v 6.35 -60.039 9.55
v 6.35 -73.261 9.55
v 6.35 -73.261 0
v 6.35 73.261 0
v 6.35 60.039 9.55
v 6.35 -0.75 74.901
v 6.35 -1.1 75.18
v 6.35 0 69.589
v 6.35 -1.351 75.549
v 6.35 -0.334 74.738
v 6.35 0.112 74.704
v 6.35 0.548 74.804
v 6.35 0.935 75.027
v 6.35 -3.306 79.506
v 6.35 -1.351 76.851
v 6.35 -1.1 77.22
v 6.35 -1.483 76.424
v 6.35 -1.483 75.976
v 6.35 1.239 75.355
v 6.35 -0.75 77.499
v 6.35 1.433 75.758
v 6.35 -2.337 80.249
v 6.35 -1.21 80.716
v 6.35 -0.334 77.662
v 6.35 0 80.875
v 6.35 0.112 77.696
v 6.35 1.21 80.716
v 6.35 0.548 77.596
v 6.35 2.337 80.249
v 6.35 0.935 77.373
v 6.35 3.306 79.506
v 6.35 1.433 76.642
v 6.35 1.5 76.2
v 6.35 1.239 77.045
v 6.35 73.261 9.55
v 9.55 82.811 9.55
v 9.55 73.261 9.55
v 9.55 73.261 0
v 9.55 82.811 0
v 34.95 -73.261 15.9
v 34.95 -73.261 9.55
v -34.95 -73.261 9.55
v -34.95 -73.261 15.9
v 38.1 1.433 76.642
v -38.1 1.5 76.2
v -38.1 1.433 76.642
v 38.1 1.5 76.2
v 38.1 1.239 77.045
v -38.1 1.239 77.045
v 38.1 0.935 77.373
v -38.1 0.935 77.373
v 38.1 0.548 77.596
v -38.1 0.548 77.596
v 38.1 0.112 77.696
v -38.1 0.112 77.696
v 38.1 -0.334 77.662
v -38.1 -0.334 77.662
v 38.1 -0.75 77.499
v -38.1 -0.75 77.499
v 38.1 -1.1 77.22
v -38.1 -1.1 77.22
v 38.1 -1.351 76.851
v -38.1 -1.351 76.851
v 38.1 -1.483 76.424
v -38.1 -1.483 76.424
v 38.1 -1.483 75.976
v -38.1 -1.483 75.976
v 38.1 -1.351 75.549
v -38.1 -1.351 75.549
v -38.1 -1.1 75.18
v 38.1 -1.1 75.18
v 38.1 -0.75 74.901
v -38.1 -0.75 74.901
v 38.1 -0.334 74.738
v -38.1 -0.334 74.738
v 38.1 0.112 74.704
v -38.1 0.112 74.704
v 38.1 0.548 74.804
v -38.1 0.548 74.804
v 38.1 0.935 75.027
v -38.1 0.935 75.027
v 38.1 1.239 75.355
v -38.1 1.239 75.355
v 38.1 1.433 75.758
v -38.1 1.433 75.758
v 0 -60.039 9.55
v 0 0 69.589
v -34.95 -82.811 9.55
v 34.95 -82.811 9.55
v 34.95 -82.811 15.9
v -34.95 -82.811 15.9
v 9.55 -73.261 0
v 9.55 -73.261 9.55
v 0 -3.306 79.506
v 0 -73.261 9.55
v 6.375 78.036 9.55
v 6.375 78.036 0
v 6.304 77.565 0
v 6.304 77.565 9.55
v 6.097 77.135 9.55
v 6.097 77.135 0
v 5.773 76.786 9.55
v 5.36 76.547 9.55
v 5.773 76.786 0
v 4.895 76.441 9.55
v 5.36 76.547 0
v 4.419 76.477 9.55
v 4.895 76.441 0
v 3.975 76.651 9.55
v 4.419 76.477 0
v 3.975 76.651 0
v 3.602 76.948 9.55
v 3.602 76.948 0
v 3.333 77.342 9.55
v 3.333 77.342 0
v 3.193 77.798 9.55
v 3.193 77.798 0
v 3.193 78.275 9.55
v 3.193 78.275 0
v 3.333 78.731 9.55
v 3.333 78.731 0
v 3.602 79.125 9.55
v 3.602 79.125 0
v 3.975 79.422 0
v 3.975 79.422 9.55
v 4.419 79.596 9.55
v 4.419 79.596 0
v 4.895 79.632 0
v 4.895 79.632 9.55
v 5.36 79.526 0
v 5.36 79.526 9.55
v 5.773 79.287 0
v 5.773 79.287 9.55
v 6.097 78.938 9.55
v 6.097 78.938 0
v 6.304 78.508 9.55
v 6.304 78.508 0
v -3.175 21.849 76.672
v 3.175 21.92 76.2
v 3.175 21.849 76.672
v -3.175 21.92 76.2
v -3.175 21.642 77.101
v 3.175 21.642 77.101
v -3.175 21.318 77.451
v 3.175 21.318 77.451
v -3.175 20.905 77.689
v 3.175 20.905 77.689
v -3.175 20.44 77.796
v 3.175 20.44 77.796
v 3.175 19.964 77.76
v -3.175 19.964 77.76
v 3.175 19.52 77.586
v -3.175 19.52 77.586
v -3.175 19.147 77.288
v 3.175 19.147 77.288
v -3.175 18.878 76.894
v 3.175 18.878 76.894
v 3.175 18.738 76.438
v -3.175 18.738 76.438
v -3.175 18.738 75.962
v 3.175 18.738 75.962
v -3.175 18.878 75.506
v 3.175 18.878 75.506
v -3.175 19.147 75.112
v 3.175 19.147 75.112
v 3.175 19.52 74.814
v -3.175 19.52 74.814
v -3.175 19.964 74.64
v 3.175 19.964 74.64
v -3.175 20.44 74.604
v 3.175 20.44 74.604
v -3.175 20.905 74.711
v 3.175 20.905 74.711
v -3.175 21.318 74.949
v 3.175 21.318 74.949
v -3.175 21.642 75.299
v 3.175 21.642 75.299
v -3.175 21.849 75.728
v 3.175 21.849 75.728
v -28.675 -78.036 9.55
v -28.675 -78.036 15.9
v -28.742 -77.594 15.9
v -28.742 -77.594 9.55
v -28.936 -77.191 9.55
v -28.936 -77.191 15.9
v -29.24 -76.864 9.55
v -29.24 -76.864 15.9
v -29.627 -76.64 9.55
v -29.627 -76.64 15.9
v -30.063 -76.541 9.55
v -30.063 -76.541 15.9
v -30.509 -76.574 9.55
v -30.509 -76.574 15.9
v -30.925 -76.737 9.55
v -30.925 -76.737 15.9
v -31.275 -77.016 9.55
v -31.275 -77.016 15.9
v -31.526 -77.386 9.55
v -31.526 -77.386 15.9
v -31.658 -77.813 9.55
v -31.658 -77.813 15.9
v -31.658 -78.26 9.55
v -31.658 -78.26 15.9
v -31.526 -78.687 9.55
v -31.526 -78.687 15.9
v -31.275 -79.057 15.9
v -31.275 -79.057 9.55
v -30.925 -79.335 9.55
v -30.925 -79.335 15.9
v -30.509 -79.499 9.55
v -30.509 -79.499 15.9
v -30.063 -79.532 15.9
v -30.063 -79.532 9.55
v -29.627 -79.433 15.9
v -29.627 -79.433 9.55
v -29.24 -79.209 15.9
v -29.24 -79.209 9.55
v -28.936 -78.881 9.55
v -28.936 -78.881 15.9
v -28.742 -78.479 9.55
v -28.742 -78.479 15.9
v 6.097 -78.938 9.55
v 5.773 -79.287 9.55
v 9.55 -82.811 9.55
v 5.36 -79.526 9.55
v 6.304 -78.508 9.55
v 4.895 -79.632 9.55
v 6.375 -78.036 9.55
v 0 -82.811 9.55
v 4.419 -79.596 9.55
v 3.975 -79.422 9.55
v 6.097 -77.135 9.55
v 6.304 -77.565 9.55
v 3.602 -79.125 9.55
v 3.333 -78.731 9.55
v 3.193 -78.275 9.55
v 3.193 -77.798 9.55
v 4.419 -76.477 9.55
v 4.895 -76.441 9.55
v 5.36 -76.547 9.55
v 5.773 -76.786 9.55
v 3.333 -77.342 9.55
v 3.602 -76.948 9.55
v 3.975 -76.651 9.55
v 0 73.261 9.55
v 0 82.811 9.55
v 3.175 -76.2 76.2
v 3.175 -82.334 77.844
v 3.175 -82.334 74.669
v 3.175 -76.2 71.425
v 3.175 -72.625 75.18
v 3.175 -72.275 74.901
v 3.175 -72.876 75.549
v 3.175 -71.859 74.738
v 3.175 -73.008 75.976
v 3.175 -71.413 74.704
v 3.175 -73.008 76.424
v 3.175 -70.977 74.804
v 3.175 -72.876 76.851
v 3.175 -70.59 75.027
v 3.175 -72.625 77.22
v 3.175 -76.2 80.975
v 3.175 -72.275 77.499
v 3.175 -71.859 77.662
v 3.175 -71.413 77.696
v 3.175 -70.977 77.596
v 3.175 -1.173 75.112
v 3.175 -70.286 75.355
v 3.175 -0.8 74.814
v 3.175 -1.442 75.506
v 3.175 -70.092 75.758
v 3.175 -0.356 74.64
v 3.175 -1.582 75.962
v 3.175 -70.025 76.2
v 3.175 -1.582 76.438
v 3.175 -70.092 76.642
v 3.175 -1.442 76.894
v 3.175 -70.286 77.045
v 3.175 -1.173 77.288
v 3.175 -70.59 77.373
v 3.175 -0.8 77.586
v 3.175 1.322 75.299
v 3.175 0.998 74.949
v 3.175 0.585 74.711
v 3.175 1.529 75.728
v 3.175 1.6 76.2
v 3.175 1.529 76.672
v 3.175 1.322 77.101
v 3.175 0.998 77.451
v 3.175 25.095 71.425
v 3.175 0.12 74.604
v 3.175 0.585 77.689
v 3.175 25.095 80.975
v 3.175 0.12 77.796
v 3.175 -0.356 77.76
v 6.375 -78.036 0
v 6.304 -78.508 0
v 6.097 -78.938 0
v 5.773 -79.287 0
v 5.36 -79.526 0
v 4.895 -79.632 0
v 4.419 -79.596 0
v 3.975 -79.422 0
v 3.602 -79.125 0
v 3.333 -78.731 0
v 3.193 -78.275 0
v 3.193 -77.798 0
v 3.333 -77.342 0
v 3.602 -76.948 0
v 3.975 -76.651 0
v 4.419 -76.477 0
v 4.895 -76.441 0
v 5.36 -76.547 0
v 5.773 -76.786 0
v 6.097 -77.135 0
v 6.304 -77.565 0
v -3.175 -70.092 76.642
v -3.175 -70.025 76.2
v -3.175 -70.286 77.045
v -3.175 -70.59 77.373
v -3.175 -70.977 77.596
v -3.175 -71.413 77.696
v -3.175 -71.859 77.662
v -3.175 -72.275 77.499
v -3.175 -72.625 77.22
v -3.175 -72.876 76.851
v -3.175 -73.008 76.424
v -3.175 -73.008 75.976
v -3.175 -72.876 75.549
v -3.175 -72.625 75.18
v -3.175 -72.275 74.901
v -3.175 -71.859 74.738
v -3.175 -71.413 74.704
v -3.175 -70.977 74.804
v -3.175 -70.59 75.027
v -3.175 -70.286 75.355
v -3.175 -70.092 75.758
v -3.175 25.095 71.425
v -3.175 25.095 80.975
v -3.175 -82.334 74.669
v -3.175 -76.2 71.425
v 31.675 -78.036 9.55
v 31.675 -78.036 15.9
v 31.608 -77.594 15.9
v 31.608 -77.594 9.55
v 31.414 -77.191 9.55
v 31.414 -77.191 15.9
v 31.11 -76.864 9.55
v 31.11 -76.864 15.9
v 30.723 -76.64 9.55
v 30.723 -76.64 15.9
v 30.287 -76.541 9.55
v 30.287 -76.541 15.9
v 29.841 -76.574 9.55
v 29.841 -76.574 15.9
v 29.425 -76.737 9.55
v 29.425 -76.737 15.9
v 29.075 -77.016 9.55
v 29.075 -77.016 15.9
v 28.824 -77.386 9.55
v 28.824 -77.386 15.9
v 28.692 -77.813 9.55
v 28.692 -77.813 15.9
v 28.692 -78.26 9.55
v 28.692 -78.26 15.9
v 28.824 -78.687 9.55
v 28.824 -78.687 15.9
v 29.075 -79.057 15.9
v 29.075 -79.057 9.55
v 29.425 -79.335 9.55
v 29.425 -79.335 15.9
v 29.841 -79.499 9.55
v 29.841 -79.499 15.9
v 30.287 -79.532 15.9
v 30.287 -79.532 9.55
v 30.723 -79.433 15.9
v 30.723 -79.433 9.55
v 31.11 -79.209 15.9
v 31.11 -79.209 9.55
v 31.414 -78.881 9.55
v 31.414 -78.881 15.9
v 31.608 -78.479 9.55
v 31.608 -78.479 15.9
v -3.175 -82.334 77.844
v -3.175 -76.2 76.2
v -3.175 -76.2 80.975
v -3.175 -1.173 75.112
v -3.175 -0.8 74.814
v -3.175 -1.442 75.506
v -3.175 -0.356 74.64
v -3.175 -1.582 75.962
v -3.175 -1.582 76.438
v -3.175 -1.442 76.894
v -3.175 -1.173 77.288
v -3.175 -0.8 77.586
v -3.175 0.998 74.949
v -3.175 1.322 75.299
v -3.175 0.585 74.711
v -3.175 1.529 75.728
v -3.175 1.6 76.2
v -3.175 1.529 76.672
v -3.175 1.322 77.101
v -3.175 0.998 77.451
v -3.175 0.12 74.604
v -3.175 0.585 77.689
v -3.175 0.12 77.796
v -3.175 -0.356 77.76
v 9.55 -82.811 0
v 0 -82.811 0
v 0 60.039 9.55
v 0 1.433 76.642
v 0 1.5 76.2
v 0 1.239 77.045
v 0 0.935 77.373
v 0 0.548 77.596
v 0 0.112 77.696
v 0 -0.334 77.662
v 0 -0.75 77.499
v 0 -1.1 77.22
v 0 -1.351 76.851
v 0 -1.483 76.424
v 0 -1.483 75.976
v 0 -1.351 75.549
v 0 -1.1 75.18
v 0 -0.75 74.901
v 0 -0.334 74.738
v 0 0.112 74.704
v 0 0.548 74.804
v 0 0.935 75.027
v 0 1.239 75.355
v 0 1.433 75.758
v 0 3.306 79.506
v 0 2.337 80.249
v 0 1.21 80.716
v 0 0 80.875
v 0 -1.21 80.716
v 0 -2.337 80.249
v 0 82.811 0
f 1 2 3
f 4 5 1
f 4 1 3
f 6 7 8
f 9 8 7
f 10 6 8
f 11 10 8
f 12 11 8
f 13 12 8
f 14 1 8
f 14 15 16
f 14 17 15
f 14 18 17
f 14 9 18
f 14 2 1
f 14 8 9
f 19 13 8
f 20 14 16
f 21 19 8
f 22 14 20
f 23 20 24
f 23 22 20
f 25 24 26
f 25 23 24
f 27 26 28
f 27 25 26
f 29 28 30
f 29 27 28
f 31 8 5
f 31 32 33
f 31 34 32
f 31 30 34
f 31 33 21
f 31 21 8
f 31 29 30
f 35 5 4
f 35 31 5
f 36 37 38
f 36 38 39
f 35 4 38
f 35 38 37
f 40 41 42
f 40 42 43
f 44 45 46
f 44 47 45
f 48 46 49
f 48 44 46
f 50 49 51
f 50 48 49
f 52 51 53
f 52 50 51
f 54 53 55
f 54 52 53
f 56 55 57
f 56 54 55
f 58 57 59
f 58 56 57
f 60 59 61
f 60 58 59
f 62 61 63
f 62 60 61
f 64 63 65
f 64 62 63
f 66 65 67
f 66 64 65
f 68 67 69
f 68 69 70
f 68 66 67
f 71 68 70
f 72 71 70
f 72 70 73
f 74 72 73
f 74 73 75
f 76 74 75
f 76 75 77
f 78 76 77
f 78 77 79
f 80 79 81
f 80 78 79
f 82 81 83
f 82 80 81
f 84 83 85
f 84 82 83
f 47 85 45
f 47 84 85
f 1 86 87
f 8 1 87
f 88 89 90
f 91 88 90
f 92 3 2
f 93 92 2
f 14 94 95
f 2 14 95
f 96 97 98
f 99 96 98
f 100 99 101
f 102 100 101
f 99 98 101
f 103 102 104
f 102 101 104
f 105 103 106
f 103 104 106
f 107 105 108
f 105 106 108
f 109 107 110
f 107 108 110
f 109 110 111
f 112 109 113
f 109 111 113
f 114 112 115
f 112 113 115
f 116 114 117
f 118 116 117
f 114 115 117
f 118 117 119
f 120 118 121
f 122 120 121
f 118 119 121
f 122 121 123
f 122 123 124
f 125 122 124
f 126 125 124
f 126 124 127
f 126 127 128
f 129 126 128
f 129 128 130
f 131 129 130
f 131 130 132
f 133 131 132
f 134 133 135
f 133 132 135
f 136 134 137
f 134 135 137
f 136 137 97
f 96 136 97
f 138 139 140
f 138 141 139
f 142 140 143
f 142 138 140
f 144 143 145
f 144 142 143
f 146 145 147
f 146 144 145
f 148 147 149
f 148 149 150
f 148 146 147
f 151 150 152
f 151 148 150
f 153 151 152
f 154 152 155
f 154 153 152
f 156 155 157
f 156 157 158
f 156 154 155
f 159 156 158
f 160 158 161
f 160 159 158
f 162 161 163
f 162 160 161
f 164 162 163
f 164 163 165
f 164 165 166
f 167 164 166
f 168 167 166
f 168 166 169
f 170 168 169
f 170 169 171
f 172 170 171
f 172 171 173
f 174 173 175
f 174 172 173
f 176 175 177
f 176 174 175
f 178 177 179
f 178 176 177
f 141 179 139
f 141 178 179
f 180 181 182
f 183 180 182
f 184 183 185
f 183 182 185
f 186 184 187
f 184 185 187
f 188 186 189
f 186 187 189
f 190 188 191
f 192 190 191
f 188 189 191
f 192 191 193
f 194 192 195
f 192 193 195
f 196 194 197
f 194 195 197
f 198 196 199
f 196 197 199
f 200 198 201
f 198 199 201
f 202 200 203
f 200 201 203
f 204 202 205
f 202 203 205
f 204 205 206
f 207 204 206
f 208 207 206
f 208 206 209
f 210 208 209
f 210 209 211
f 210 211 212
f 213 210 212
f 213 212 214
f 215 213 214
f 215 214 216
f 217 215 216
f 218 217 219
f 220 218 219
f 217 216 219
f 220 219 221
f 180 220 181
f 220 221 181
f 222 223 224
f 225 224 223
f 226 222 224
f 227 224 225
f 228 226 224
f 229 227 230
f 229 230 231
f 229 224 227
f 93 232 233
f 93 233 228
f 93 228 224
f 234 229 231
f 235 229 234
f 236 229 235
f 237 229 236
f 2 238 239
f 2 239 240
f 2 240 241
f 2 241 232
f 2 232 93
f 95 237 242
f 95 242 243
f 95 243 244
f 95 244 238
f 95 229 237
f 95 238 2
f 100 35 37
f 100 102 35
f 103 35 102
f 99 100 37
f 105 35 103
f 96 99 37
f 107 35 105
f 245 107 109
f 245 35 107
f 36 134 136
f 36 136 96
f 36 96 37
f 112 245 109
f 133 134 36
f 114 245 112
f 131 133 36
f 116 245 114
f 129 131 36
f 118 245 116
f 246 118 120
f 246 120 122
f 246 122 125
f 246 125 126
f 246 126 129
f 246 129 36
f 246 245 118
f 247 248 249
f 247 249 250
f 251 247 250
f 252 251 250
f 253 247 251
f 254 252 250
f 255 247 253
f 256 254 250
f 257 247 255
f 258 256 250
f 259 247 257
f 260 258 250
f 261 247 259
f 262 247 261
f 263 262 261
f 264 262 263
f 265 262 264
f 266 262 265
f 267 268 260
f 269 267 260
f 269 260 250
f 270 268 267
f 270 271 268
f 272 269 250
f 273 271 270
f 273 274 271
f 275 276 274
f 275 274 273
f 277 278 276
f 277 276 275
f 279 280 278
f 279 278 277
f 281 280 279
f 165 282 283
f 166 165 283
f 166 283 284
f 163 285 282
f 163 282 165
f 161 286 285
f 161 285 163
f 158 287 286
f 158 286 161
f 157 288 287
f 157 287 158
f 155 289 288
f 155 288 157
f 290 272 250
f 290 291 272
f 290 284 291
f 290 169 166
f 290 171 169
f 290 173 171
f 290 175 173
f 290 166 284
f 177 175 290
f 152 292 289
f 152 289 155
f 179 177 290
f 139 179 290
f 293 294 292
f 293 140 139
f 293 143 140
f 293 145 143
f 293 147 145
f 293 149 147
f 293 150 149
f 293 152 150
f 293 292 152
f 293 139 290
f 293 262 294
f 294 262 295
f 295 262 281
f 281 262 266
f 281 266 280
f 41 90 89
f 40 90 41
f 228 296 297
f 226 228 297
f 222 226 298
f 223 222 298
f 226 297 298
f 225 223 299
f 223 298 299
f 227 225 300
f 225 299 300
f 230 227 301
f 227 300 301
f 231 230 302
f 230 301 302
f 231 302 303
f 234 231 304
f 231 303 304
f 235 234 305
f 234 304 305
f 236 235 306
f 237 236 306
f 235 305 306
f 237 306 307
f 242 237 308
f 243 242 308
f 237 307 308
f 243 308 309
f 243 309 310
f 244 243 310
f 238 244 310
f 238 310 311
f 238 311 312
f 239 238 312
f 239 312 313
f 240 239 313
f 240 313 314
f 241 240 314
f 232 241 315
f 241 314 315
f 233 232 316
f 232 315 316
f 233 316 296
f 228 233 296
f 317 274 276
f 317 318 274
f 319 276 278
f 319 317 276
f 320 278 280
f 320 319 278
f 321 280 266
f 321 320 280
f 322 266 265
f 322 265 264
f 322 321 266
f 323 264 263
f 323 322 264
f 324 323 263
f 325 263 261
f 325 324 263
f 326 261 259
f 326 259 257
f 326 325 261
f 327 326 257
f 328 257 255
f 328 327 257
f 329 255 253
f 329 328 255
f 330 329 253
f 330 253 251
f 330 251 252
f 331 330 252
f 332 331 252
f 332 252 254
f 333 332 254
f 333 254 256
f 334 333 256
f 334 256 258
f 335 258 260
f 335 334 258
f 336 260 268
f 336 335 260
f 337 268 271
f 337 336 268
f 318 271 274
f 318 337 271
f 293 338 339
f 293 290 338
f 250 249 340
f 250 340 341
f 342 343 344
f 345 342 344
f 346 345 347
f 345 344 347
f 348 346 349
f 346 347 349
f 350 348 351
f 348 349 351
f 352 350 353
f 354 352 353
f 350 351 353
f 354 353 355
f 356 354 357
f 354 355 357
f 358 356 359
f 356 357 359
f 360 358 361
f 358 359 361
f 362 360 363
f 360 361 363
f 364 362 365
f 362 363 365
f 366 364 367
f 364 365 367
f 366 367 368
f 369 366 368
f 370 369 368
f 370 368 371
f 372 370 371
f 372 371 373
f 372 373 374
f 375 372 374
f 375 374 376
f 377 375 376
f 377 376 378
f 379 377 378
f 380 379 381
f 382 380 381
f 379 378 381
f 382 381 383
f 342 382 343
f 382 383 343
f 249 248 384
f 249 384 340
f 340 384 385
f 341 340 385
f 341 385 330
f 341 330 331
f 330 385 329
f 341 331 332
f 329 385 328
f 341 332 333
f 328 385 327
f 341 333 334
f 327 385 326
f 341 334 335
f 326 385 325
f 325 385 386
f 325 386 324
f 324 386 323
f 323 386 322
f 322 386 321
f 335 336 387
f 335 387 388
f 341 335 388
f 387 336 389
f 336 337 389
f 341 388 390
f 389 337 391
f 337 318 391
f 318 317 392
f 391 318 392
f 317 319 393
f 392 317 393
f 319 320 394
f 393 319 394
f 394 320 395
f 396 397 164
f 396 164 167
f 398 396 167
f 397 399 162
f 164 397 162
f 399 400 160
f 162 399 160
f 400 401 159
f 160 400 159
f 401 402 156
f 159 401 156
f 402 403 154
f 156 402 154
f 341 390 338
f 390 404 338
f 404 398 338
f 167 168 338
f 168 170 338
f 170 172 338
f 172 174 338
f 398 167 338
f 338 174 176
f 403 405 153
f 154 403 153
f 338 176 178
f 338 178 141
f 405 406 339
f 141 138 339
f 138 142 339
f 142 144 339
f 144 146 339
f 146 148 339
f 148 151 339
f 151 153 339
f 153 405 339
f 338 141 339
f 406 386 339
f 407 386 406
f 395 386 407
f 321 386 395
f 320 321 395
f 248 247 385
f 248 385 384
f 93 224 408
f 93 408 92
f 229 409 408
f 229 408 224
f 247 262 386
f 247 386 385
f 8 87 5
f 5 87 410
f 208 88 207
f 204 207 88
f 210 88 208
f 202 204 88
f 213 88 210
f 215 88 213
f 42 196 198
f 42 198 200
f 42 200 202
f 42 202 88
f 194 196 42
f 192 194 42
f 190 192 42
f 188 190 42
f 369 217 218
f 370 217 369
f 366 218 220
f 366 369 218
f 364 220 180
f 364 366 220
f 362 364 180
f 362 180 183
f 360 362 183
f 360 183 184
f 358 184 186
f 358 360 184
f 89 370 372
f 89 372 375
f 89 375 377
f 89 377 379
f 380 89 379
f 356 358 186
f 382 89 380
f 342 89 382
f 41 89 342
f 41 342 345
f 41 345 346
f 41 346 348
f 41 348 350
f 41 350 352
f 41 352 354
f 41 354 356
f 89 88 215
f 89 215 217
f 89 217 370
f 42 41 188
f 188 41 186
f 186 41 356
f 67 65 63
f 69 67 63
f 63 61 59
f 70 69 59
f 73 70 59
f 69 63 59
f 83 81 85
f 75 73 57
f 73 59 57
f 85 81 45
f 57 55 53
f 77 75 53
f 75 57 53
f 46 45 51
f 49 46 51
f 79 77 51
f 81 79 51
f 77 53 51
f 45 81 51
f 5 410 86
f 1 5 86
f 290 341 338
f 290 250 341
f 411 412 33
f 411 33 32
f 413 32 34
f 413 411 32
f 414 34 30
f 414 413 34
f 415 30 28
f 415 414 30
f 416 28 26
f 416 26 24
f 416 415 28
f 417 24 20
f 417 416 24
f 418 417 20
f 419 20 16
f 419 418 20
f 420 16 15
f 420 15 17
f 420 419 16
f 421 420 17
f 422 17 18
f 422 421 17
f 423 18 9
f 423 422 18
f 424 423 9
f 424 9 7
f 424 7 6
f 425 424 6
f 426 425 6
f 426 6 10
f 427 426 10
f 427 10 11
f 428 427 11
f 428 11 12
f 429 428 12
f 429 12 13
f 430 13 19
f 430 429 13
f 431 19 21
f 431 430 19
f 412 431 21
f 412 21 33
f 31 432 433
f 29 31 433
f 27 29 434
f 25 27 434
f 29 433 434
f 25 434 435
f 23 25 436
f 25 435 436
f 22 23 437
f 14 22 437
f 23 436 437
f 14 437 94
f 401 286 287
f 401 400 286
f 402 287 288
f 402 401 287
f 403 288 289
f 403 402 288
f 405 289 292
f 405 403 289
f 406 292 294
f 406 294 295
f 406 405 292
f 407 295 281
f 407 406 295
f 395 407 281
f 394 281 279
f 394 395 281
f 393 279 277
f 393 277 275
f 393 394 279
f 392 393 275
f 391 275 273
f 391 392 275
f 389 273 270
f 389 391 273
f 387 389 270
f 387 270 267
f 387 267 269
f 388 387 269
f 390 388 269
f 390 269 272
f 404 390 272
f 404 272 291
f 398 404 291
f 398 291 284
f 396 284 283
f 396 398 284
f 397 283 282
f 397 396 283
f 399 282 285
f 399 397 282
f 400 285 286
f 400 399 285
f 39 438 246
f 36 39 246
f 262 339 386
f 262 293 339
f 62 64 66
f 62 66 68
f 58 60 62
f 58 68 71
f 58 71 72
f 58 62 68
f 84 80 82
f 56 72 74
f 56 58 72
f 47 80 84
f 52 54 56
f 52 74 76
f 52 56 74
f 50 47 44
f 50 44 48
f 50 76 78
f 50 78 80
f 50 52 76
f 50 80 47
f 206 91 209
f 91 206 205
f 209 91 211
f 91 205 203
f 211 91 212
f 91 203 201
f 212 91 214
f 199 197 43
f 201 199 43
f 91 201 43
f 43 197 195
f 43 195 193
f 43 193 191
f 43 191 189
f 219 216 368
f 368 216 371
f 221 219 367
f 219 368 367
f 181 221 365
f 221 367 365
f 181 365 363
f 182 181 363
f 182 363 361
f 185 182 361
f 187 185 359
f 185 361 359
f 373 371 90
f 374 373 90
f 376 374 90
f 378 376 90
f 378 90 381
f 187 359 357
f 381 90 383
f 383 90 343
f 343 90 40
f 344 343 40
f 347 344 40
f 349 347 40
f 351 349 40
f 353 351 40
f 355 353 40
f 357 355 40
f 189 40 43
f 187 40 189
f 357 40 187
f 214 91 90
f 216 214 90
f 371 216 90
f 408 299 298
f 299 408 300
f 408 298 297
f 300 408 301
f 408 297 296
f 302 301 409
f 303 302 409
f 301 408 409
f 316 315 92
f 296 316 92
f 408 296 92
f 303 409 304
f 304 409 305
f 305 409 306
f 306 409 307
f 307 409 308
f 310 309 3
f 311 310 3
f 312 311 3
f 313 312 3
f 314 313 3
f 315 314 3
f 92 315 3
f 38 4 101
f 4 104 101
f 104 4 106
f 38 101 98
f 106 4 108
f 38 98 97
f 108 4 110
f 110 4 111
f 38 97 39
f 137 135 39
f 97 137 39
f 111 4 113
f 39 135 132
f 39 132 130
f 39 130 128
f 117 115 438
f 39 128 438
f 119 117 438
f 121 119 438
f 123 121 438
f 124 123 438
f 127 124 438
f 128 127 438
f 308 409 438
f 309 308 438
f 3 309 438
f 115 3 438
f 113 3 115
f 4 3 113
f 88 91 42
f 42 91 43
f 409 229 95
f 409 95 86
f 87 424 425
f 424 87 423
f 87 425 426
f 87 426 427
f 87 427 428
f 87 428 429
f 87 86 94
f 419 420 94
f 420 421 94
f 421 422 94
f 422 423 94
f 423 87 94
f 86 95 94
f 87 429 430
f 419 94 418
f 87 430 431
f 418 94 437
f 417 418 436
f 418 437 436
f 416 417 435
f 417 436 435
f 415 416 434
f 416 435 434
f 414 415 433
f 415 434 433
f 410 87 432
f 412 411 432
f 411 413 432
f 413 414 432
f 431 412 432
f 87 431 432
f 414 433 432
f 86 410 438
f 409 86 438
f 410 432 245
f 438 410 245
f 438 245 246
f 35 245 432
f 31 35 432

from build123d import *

# Parameters (mm, degrees)
F5_W      = 9.55
F5_H      = 9.55
F7_DEPTH  = 9.55
F5_R      = 1.5
F8_DEPTH  = 6.35
F5_H_2    = 6.35
F9_DEPTH  = 34.95
F10_R     = 1.5
F11_DEPTH = 6.35
F12_R     = 1.6
F13_DEPTH = 9.55
F6_R      = 1.5
F6_R_2    = 1.6
F14_DEPTH = 3.175
F15_DEPTH = 38.1


# Not quite as in the source:
# - a length typed as a fraction of an inch, garbled in the dataset ("3 / 203.2 mm" for 3/8 in), is restored


with BuildPart() as f7:
    # F5 (on Right) → F7 (new body)
    with BuildSketch(Plane.YZ):
        with Locations((-78.0364484041, 4.775)):
            Rectangle(F5_W, F5_H)
    extrude(amount=F7_DEPTH)



with BuildPart() as f7b:
    # F5 (on Right) → F7, piece 2 (new body)
    with BuildSketch(Plane.YZ):
        with Locations((78.0364484041, 4.775)):
            Rectangle(F5_W, F5_H)
    extrude(amount=F7_DEPTH)


with BuildPart() as f7_1:
    add(f7.part)

    add(f7b.part)  # F8 merges F7b
    # F5 (on Right) → F8 (join)
    with BuildSketch(Plane.YZ):
        with BuildLine():
            Line((-3.305724202, 79.505724202), (-73.2614484041, 9.55))
            Line((-73.2614484041, 9.55), (-60.0385515959, 9.55))
            Line((-60.0385515959, 9.55), (0, 69.5885515959))
            Line((0, 69.5885515959), (60.0385515959, 9.55))
            Line((60.0385515959, 9.55), (73.2614484041, 9.55))
            Line((73.2614484041, 9.55), (3.305724202, 79.505724202))
            ThreePointArc((3.305724202, 79.505724202), (0, 80.875), (-3.305724202, 79.505724202))
        make_face()
        with Locations((0, 76.2)):
            Circle(F5_R, mode=Mode.SUBTRACT)
        Polygon((-73.2614484041, 9.55), (-73.2614484041, 0), (73.2614484041, 0), (73.2614484041, 9.55), (60.0385515959, 9.55), (-60.0385515959, 9.55), align=None)
    extrude(amount=F8_DEPTH)

    # F12 (on face) → F13 (cut, through all)
    with BuildSketch(Plane(origin=(0, 0, 0), x_dir=(1, 0, 0), z_dir=(0, 0, -1))):
        with Locations((4.775, 78.0364484041)):
            Circle(F12_R)
        with Locations((4.775, -78.0364484041)):
            Circle(F12_R)
    extrude(amount=-F13_DEPTH, mode=Mode.SUBTRACT)


with BuildPart() as f9:
    # F5 (on Right) → F9 (new body, symmetric)
    with BuildSketch(Plane.YZ):
        with Locations((-78.0364484041, 12.725)):
            Rectangle(F5_W, F5_H_2)
    extrude(amount=F9_DEPTH, both=True)

    # F10 (on face) → F11 (cut, through all)
    with BuildSketch(Plane.XY.offset(15.9)):
        with Locations((30.175, -78.0364484041)):
            Circle(F10_R)
        with Locations((-30.175, -78.0364484041)):
            Circle(F10_R)
    extrude(amount=-F11_DEPTH, mode=Mode.SUBTRACT)


with BuildPart() as f14:
    # F6 (on Right) → F14 (new body, symmetric)
    with BuildSketch(Plane.YZ):
        Polygon((25.095, 80.975), (-76.2, 80.975), (-76.2, 76.2), (-76.2, 71.425), (25.095, 71.425), align=None)
        with Locations((-71.525, 76.2)):
            Circle(F6_R, mode=Mode.SUBTRACT)
        with Locations((0, 76.2)):
            Circle(F6_R_2, mode=Mode.SUBTRACT)
        with Locations((20.32, 76.2)):
            Circle(F6_R_2, mode=Mode.SUBTRACT)
        Polygon((-76.2, 71.425), (-76.2, 76.2), (-82.3336289969, 77.8435009364), (-82.3336289969, 74.6685009364), align=None)
    extrude(amount=F14_DEPTH, both=True)


with BuildPart() as f15:
    # F5 (on Right) → F15 (new body, symmetric)
    with BuildSketch(Plane.YZ):
        with Locations((0, 76.2)):
            Circle(F5_R)
    extrude(amount=F15_DEPTH, both=True)


solid = Compound([f7_1.part, f9.part, f14.part, f15.part])
